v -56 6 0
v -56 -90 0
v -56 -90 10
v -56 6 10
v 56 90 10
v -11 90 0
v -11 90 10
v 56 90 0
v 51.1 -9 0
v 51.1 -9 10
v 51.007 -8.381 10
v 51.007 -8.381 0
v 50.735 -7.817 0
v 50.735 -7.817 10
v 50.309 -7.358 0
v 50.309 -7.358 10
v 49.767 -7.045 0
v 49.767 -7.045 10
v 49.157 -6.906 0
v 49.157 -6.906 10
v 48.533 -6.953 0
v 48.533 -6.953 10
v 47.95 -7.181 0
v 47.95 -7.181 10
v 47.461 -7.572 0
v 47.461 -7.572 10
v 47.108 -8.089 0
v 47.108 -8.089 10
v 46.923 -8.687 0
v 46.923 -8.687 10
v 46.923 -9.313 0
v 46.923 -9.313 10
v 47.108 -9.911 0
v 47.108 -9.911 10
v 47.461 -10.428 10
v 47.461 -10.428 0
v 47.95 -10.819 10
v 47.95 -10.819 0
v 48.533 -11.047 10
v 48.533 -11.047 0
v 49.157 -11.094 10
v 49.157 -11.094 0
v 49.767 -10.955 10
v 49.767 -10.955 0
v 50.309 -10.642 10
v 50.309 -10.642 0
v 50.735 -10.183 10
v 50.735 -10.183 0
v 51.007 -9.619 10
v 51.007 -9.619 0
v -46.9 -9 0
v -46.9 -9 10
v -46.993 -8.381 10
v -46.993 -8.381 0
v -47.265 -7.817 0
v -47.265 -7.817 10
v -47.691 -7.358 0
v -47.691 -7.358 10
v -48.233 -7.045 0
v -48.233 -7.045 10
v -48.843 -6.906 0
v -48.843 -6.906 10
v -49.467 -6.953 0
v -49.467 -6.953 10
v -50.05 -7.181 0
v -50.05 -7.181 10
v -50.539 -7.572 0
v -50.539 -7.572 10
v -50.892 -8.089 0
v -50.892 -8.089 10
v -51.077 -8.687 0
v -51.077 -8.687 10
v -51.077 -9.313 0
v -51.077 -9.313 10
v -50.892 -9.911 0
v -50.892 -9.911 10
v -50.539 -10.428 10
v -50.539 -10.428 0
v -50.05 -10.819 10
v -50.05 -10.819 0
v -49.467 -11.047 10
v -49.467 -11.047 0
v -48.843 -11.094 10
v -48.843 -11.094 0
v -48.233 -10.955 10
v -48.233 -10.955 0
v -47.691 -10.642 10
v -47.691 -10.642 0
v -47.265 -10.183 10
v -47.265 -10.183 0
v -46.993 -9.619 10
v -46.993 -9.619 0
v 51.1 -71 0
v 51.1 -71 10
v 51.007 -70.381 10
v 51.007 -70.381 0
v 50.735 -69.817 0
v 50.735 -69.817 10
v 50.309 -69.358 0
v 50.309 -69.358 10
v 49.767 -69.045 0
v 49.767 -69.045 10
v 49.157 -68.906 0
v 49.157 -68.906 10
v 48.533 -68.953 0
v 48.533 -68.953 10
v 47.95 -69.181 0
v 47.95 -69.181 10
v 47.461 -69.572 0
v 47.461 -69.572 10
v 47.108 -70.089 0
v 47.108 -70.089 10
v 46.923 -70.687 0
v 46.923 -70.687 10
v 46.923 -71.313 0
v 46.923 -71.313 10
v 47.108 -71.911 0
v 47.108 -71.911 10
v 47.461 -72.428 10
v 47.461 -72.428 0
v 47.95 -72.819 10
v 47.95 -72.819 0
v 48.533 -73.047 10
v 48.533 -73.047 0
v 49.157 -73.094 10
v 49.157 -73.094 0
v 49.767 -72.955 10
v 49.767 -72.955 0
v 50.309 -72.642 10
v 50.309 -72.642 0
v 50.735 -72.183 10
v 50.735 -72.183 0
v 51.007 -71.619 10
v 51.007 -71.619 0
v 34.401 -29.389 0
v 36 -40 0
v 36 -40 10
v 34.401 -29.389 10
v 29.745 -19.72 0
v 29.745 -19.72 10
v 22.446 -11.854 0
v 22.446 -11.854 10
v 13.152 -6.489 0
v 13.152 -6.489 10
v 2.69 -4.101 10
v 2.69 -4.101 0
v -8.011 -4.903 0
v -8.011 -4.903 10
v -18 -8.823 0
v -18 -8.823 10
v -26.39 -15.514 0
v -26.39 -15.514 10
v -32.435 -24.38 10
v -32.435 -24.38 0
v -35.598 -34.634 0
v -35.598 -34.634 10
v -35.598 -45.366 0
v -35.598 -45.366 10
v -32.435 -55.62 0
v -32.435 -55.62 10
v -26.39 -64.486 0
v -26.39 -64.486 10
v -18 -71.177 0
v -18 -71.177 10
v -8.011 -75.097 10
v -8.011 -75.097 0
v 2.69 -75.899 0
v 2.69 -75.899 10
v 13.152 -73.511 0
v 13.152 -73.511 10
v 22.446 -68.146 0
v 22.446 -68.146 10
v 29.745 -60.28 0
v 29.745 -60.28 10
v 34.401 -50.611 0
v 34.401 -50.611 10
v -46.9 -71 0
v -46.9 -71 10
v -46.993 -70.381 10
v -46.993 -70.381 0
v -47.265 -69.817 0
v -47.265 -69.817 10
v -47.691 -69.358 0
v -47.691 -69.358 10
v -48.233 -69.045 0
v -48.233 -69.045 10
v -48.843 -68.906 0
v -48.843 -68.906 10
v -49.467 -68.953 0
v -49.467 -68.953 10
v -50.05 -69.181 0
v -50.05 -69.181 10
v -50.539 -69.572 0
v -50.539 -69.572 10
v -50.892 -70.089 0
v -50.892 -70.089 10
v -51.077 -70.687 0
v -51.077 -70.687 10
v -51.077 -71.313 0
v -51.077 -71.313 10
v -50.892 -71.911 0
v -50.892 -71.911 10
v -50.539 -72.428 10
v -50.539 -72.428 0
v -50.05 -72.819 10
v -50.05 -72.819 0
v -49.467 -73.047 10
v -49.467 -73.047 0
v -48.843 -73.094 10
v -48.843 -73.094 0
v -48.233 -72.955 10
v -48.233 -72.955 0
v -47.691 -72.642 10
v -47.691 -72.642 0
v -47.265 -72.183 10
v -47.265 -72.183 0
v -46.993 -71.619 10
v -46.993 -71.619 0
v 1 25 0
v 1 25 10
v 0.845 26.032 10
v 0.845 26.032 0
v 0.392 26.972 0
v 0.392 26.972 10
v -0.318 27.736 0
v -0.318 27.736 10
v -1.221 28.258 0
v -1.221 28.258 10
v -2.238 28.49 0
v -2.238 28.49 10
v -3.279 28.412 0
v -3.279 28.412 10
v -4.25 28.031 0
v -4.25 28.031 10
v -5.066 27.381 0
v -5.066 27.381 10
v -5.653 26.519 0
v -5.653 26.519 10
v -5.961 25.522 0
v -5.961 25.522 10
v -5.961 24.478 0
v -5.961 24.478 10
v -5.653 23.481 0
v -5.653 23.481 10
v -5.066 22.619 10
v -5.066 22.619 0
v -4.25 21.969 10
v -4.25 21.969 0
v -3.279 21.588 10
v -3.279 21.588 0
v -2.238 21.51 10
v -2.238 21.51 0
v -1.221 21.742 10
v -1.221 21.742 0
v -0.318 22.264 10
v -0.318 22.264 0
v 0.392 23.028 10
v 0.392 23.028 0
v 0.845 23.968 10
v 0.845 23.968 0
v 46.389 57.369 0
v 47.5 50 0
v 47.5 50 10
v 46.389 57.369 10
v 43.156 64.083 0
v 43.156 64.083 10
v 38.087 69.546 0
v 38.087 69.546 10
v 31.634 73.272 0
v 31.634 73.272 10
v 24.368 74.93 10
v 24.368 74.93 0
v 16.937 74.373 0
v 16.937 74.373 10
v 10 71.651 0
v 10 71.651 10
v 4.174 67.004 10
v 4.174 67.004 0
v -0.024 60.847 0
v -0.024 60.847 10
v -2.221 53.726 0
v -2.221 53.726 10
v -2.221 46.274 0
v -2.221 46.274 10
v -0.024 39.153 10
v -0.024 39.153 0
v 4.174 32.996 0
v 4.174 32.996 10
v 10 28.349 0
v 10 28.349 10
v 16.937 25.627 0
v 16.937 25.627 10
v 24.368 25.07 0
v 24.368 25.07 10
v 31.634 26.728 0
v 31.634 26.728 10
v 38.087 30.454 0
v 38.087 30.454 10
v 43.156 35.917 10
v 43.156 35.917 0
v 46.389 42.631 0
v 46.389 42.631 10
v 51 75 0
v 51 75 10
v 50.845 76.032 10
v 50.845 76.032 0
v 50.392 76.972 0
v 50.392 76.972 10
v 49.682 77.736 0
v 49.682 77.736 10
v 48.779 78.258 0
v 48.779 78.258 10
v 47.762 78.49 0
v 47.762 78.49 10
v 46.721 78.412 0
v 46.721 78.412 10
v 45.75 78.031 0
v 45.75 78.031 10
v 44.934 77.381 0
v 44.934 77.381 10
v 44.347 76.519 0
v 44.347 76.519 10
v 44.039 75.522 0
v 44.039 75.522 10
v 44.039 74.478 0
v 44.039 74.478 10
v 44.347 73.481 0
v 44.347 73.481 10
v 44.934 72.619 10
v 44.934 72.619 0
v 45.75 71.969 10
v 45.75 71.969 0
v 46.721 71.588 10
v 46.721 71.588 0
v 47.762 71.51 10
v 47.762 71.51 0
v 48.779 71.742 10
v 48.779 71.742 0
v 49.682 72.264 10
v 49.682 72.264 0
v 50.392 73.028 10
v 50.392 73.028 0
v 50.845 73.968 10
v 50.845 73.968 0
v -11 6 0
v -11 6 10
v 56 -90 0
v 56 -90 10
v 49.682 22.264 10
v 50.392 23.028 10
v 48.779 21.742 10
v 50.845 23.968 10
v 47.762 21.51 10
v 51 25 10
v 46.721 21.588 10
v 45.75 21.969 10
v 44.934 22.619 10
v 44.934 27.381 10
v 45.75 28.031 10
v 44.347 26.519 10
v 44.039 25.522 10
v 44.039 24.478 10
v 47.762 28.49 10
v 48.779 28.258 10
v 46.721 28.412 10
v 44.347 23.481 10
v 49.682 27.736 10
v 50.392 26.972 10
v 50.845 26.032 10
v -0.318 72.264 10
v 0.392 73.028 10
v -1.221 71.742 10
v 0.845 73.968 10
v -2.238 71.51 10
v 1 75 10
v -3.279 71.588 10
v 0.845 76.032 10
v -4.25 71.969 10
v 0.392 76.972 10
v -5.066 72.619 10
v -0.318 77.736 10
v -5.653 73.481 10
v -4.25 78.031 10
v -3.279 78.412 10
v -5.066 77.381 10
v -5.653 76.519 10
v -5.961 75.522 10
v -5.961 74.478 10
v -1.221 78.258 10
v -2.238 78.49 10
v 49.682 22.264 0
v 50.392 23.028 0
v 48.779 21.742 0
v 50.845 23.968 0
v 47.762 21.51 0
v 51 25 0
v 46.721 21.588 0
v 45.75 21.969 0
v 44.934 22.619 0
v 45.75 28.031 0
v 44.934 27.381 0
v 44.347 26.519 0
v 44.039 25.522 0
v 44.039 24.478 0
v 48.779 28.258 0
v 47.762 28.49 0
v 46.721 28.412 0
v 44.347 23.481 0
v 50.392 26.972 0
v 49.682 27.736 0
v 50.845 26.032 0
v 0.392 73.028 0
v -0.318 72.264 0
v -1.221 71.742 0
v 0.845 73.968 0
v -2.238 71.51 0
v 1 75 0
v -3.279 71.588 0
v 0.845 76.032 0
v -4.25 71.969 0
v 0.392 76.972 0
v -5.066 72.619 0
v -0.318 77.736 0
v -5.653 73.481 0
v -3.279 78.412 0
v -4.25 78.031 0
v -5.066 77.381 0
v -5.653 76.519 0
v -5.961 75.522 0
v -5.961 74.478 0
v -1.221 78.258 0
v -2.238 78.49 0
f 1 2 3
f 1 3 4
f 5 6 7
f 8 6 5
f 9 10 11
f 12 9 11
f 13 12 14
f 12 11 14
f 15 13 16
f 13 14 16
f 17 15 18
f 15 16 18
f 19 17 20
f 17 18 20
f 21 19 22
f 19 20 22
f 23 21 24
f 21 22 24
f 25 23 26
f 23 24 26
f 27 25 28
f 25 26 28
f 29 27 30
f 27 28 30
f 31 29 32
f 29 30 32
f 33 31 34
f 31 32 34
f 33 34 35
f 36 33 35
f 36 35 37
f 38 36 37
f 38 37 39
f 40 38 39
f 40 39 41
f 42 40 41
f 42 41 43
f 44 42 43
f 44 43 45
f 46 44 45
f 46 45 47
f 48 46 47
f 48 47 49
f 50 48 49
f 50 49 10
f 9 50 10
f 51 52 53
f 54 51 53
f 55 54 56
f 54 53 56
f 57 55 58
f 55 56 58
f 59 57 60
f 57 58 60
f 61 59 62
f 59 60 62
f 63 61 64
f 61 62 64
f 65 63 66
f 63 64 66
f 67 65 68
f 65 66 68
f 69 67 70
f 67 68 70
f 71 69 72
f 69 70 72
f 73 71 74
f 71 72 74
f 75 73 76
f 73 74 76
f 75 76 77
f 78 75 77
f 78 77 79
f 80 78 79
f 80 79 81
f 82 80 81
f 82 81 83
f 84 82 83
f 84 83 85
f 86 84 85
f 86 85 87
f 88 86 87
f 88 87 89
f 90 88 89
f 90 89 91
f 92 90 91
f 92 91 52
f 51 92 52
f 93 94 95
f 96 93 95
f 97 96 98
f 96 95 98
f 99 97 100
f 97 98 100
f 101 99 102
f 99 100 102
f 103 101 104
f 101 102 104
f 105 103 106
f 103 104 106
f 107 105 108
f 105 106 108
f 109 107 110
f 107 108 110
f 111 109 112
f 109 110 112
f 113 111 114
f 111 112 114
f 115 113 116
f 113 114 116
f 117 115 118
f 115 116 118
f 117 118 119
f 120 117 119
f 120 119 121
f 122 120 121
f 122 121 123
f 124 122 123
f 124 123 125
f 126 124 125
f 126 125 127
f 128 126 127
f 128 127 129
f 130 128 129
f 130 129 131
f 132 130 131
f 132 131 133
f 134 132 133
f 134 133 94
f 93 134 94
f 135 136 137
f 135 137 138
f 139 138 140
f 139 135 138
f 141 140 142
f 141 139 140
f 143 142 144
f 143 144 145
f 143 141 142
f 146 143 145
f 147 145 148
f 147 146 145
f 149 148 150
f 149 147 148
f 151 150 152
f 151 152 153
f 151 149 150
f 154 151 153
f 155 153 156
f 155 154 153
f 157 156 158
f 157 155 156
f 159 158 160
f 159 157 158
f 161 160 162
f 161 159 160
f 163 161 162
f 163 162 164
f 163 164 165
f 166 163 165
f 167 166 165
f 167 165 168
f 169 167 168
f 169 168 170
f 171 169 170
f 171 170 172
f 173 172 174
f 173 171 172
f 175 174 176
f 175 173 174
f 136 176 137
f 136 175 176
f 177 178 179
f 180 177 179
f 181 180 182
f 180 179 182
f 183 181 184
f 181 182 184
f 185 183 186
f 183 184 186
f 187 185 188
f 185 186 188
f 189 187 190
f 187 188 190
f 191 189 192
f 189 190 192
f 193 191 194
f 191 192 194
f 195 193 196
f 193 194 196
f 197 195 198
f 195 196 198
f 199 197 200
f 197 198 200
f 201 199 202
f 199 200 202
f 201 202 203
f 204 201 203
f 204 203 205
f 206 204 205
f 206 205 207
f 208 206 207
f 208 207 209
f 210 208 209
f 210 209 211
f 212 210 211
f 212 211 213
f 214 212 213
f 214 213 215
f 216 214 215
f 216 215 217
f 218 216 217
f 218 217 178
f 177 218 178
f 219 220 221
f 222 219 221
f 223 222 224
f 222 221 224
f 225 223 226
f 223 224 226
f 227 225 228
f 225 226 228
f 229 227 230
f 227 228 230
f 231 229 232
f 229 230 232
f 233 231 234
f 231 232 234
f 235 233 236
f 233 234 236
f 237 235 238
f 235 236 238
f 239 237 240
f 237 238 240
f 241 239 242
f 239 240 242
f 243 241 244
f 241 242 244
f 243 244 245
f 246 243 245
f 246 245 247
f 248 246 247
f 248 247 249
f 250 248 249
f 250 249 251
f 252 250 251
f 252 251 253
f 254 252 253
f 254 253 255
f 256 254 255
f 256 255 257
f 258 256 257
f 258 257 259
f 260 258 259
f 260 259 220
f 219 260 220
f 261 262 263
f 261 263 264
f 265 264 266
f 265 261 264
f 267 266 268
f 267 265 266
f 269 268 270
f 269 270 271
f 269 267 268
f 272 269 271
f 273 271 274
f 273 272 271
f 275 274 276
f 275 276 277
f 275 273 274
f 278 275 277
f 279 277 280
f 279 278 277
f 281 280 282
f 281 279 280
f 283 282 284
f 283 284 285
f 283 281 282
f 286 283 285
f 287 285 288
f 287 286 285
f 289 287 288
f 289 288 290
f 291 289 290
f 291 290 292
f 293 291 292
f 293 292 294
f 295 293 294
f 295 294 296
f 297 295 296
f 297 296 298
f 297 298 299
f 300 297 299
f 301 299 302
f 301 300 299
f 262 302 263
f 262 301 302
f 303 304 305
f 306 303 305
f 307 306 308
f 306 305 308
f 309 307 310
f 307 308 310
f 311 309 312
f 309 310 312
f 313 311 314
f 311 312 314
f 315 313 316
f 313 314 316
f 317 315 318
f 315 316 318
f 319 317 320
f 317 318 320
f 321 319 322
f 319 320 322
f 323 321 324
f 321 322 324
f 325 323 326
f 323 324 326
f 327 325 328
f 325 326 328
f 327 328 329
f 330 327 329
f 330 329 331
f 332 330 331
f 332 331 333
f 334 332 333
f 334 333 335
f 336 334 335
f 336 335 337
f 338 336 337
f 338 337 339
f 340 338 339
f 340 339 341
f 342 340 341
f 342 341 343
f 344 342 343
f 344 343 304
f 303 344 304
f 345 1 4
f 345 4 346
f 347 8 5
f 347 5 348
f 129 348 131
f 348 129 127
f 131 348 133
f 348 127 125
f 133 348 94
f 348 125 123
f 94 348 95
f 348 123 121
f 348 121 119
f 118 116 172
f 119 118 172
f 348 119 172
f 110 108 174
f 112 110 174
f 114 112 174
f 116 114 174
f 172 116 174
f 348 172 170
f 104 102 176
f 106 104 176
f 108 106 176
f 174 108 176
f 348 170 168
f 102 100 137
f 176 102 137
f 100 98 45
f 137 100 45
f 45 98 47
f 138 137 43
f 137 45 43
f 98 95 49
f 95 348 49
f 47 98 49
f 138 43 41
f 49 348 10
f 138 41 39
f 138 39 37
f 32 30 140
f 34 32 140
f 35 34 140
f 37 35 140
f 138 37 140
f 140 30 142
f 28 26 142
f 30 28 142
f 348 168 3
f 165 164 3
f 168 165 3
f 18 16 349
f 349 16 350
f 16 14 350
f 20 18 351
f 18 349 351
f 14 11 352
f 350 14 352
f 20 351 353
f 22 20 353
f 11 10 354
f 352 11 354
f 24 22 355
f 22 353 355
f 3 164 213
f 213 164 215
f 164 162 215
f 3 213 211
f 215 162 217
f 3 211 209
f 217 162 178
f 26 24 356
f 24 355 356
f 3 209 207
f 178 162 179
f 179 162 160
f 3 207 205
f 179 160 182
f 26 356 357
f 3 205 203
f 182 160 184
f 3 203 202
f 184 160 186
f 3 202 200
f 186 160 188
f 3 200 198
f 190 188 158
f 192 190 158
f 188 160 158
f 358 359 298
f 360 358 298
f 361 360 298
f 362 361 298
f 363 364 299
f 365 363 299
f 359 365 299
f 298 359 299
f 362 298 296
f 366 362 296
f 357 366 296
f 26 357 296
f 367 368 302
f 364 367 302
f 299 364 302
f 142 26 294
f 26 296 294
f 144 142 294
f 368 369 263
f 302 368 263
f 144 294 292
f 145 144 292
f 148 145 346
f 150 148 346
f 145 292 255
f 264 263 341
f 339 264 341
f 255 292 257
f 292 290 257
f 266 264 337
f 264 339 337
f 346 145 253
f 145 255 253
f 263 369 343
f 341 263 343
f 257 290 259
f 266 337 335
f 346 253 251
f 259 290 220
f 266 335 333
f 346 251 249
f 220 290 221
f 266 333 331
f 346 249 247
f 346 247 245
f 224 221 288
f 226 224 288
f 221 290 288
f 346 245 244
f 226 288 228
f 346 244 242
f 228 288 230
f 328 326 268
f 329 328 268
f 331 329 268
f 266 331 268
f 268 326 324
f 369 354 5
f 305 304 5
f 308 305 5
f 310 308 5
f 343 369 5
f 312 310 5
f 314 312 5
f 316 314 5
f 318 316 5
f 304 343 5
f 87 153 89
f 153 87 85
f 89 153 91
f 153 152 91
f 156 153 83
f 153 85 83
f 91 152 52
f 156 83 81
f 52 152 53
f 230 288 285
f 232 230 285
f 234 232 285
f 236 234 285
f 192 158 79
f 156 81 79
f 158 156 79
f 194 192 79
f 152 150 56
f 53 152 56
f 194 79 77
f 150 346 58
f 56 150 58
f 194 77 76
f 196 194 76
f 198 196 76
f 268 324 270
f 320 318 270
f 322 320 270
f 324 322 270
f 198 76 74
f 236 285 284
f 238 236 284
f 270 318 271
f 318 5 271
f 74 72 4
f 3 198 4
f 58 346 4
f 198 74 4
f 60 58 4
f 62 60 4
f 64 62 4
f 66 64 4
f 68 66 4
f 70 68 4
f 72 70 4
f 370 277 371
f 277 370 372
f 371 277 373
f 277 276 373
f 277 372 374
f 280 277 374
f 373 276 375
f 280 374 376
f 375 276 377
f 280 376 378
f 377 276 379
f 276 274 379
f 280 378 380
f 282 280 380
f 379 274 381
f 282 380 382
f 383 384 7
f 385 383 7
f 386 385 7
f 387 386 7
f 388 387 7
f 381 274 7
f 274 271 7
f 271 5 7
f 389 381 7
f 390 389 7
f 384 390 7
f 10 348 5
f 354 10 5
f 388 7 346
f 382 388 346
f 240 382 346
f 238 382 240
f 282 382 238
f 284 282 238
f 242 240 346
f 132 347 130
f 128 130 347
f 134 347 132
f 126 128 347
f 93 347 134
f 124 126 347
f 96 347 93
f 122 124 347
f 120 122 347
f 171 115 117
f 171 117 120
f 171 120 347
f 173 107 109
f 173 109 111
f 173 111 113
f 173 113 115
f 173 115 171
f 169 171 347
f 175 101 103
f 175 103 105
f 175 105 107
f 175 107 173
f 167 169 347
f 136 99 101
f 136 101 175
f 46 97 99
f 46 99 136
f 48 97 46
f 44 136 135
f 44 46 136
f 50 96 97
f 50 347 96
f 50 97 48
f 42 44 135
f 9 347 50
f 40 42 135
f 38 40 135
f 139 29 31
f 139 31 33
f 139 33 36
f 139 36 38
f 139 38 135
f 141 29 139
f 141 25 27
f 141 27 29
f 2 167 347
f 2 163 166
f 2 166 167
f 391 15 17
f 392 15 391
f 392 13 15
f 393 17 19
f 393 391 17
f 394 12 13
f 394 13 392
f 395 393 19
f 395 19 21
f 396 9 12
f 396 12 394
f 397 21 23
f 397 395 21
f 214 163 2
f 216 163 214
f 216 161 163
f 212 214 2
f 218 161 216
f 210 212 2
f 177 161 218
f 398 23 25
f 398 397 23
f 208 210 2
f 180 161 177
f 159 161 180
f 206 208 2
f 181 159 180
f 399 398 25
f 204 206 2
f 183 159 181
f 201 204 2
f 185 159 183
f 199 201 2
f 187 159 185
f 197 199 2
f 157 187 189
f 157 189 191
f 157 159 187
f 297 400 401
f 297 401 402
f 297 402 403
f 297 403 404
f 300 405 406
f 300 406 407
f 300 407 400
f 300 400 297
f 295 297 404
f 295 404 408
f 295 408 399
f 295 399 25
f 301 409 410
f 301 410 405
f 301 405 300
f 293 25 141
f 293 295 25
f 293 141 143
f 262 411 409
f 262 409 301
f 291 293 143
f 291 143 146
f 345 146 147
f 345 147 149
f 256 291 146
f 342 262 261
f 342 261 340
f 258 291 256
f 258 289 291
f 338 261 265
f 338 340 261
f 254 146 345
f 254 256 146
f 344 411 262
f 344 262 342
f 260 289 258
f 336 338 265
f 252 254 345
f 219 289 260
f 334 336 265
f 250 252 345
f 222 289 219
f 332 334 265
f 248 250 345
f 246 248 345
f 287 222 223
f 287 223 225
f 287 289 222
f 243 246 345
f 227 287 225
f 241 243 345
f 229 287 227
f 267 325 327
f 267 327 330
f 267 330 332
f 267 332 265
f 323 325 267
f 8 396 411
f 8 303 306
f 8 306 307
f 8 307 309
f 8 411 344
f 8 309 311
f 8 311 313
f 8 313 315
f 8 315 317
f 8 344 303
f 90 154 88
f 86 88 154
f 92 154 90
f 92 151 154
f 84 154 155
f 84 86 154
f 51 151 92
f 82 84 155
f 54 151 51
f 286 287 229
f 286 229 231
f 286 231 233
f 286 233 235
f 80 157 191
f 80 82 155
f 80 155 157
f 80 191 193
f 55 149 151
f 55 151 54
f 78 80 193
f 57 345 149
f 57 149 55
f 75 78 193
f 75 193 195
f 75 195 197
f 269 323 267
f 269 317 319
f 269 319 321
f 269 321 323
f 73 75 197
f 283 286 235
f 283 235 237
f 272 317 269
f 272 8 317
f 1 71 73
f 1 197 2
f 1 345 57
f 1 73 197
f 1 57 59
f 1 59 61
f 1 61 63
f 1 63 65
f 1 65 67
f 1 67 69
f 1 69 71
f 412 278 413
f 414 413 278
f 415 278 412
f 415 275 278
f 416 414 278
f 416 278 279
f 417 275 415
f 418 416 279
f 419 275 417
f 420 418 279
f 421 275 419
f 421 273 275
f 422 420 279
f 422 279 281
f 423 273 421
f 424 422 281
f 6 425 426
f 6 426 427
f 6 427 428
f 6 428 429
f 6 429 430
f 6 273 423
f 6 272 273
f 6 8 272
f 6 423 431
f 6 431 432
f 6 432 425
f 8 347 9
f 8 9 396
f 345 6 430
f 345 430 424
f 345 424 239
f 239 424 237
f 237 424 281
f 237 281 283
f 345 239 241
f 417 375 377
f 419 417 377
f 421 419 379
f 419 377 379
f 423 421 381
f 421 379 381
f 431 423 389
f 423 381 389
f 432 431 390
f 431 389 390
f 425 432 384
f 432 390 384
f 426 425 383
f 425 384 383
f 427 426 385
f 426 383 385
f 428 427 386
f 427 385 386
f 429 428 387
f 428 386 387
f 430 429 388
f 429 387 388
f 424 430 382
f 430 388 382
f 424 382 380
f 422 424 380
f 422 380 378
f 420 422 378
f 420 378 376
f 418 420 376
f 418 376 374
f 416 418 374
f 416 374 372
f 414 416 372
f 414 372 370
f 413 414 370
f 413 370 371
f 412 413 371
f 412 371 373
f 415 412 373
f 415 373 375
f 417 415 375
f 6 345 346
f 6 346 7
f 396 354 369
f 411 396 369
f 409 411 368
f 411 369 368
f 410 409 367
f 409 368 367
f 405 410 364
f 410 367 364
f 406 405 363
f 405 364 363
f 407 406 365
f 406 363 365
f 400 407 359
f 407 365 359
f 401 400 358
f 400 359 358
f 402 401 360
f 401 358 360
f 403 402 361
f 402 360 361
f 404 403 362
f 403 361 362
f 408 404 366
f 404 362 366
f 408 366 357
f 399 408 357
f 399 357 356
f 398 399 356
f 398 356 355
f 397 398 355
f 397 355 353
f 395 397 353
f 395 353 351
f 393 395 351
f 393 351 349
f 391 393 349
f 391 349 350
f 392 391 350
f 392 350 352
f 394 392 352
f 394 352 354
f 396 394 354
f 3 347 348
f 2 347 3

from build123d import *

# Parameters (mm, degrees)
SKETCH_1_R             = 36
SKETCH_1_R_2           = 25
EXTRUDE_1_DEPTH        = 10
HOLE_WIZARD_M5_1_D     = 4.2
HOLE_WIZARD_M5_1_DEPTH = 12.4
HOLE_WIZARD_M5_1_TIP   = 1.2618073
MM_1_D                 = 7
MM_1_DEPTH             = 12.4
MM_1_TIP               = 2.103012167


with BuildPart() as part:
    # 草图1 → 凸台-拉伸1 (new body)
    with BuildSketch(Plane.XY):
        Polygon((-11, 90), (56, 90), (56, -90), (-56, -90), (-56, 6), (-11, 6), align=None)
        with Locations((0, -40)):
            Circle(SKETCH_1_R, mode=Mode.SUBTRACT)
        with Locations((22.5, 50)):
            Circle(SKETCH_1_R_2, mode=Mode.SUBTRACT)
    extrude(amount=EXTRUDE_1_DEPTH)

    # M5 螺纹孔1
    with Locations(Plane(origin=(49, -9, 0), x_dir=(-1, 0, 0), z_dir=(0, 0, -1))):
        with Locations((0, 0), (98, 0), (98, -62), (0, -62)):
            Hole(HOLE_WIZARD_M5_1_D / 2, depth=HOLE_WIZARD_M5_1_DEPTH)
            with Locations((0, 0, -(HOLE_WIZARD_M5_1_DEPTH + HOLE_WIZARD_M5_1_TIP / 2))):  # 118° drill point
                Cone(0, HOLE_WIZARD_M5_1_D / 2, HOLE_WIZARD_M5_1_TIP, mode=Mode.SUBTRACT)

    # 大小mm 暗销槽口1
    with Locations(Plane(origin=(47.5, 25, 0), x_dir=(-1, 0, 0), z_dir=(0, 0, -1))):
        with Locations((0, 0), (0, 50), (50, 50), (50, 0)):
            Hole(MM_1_D / 2, depth=MM_1_DEPTH)
            with Locations((0, 0, -(MM_1_DEPTH + MM_1_TIP / 2))):  # 118° drill point
                Cone(0, MM_1_D / 2, MM_1_TIP, mode=Mode.SUBTRACT)


solid = part.part
